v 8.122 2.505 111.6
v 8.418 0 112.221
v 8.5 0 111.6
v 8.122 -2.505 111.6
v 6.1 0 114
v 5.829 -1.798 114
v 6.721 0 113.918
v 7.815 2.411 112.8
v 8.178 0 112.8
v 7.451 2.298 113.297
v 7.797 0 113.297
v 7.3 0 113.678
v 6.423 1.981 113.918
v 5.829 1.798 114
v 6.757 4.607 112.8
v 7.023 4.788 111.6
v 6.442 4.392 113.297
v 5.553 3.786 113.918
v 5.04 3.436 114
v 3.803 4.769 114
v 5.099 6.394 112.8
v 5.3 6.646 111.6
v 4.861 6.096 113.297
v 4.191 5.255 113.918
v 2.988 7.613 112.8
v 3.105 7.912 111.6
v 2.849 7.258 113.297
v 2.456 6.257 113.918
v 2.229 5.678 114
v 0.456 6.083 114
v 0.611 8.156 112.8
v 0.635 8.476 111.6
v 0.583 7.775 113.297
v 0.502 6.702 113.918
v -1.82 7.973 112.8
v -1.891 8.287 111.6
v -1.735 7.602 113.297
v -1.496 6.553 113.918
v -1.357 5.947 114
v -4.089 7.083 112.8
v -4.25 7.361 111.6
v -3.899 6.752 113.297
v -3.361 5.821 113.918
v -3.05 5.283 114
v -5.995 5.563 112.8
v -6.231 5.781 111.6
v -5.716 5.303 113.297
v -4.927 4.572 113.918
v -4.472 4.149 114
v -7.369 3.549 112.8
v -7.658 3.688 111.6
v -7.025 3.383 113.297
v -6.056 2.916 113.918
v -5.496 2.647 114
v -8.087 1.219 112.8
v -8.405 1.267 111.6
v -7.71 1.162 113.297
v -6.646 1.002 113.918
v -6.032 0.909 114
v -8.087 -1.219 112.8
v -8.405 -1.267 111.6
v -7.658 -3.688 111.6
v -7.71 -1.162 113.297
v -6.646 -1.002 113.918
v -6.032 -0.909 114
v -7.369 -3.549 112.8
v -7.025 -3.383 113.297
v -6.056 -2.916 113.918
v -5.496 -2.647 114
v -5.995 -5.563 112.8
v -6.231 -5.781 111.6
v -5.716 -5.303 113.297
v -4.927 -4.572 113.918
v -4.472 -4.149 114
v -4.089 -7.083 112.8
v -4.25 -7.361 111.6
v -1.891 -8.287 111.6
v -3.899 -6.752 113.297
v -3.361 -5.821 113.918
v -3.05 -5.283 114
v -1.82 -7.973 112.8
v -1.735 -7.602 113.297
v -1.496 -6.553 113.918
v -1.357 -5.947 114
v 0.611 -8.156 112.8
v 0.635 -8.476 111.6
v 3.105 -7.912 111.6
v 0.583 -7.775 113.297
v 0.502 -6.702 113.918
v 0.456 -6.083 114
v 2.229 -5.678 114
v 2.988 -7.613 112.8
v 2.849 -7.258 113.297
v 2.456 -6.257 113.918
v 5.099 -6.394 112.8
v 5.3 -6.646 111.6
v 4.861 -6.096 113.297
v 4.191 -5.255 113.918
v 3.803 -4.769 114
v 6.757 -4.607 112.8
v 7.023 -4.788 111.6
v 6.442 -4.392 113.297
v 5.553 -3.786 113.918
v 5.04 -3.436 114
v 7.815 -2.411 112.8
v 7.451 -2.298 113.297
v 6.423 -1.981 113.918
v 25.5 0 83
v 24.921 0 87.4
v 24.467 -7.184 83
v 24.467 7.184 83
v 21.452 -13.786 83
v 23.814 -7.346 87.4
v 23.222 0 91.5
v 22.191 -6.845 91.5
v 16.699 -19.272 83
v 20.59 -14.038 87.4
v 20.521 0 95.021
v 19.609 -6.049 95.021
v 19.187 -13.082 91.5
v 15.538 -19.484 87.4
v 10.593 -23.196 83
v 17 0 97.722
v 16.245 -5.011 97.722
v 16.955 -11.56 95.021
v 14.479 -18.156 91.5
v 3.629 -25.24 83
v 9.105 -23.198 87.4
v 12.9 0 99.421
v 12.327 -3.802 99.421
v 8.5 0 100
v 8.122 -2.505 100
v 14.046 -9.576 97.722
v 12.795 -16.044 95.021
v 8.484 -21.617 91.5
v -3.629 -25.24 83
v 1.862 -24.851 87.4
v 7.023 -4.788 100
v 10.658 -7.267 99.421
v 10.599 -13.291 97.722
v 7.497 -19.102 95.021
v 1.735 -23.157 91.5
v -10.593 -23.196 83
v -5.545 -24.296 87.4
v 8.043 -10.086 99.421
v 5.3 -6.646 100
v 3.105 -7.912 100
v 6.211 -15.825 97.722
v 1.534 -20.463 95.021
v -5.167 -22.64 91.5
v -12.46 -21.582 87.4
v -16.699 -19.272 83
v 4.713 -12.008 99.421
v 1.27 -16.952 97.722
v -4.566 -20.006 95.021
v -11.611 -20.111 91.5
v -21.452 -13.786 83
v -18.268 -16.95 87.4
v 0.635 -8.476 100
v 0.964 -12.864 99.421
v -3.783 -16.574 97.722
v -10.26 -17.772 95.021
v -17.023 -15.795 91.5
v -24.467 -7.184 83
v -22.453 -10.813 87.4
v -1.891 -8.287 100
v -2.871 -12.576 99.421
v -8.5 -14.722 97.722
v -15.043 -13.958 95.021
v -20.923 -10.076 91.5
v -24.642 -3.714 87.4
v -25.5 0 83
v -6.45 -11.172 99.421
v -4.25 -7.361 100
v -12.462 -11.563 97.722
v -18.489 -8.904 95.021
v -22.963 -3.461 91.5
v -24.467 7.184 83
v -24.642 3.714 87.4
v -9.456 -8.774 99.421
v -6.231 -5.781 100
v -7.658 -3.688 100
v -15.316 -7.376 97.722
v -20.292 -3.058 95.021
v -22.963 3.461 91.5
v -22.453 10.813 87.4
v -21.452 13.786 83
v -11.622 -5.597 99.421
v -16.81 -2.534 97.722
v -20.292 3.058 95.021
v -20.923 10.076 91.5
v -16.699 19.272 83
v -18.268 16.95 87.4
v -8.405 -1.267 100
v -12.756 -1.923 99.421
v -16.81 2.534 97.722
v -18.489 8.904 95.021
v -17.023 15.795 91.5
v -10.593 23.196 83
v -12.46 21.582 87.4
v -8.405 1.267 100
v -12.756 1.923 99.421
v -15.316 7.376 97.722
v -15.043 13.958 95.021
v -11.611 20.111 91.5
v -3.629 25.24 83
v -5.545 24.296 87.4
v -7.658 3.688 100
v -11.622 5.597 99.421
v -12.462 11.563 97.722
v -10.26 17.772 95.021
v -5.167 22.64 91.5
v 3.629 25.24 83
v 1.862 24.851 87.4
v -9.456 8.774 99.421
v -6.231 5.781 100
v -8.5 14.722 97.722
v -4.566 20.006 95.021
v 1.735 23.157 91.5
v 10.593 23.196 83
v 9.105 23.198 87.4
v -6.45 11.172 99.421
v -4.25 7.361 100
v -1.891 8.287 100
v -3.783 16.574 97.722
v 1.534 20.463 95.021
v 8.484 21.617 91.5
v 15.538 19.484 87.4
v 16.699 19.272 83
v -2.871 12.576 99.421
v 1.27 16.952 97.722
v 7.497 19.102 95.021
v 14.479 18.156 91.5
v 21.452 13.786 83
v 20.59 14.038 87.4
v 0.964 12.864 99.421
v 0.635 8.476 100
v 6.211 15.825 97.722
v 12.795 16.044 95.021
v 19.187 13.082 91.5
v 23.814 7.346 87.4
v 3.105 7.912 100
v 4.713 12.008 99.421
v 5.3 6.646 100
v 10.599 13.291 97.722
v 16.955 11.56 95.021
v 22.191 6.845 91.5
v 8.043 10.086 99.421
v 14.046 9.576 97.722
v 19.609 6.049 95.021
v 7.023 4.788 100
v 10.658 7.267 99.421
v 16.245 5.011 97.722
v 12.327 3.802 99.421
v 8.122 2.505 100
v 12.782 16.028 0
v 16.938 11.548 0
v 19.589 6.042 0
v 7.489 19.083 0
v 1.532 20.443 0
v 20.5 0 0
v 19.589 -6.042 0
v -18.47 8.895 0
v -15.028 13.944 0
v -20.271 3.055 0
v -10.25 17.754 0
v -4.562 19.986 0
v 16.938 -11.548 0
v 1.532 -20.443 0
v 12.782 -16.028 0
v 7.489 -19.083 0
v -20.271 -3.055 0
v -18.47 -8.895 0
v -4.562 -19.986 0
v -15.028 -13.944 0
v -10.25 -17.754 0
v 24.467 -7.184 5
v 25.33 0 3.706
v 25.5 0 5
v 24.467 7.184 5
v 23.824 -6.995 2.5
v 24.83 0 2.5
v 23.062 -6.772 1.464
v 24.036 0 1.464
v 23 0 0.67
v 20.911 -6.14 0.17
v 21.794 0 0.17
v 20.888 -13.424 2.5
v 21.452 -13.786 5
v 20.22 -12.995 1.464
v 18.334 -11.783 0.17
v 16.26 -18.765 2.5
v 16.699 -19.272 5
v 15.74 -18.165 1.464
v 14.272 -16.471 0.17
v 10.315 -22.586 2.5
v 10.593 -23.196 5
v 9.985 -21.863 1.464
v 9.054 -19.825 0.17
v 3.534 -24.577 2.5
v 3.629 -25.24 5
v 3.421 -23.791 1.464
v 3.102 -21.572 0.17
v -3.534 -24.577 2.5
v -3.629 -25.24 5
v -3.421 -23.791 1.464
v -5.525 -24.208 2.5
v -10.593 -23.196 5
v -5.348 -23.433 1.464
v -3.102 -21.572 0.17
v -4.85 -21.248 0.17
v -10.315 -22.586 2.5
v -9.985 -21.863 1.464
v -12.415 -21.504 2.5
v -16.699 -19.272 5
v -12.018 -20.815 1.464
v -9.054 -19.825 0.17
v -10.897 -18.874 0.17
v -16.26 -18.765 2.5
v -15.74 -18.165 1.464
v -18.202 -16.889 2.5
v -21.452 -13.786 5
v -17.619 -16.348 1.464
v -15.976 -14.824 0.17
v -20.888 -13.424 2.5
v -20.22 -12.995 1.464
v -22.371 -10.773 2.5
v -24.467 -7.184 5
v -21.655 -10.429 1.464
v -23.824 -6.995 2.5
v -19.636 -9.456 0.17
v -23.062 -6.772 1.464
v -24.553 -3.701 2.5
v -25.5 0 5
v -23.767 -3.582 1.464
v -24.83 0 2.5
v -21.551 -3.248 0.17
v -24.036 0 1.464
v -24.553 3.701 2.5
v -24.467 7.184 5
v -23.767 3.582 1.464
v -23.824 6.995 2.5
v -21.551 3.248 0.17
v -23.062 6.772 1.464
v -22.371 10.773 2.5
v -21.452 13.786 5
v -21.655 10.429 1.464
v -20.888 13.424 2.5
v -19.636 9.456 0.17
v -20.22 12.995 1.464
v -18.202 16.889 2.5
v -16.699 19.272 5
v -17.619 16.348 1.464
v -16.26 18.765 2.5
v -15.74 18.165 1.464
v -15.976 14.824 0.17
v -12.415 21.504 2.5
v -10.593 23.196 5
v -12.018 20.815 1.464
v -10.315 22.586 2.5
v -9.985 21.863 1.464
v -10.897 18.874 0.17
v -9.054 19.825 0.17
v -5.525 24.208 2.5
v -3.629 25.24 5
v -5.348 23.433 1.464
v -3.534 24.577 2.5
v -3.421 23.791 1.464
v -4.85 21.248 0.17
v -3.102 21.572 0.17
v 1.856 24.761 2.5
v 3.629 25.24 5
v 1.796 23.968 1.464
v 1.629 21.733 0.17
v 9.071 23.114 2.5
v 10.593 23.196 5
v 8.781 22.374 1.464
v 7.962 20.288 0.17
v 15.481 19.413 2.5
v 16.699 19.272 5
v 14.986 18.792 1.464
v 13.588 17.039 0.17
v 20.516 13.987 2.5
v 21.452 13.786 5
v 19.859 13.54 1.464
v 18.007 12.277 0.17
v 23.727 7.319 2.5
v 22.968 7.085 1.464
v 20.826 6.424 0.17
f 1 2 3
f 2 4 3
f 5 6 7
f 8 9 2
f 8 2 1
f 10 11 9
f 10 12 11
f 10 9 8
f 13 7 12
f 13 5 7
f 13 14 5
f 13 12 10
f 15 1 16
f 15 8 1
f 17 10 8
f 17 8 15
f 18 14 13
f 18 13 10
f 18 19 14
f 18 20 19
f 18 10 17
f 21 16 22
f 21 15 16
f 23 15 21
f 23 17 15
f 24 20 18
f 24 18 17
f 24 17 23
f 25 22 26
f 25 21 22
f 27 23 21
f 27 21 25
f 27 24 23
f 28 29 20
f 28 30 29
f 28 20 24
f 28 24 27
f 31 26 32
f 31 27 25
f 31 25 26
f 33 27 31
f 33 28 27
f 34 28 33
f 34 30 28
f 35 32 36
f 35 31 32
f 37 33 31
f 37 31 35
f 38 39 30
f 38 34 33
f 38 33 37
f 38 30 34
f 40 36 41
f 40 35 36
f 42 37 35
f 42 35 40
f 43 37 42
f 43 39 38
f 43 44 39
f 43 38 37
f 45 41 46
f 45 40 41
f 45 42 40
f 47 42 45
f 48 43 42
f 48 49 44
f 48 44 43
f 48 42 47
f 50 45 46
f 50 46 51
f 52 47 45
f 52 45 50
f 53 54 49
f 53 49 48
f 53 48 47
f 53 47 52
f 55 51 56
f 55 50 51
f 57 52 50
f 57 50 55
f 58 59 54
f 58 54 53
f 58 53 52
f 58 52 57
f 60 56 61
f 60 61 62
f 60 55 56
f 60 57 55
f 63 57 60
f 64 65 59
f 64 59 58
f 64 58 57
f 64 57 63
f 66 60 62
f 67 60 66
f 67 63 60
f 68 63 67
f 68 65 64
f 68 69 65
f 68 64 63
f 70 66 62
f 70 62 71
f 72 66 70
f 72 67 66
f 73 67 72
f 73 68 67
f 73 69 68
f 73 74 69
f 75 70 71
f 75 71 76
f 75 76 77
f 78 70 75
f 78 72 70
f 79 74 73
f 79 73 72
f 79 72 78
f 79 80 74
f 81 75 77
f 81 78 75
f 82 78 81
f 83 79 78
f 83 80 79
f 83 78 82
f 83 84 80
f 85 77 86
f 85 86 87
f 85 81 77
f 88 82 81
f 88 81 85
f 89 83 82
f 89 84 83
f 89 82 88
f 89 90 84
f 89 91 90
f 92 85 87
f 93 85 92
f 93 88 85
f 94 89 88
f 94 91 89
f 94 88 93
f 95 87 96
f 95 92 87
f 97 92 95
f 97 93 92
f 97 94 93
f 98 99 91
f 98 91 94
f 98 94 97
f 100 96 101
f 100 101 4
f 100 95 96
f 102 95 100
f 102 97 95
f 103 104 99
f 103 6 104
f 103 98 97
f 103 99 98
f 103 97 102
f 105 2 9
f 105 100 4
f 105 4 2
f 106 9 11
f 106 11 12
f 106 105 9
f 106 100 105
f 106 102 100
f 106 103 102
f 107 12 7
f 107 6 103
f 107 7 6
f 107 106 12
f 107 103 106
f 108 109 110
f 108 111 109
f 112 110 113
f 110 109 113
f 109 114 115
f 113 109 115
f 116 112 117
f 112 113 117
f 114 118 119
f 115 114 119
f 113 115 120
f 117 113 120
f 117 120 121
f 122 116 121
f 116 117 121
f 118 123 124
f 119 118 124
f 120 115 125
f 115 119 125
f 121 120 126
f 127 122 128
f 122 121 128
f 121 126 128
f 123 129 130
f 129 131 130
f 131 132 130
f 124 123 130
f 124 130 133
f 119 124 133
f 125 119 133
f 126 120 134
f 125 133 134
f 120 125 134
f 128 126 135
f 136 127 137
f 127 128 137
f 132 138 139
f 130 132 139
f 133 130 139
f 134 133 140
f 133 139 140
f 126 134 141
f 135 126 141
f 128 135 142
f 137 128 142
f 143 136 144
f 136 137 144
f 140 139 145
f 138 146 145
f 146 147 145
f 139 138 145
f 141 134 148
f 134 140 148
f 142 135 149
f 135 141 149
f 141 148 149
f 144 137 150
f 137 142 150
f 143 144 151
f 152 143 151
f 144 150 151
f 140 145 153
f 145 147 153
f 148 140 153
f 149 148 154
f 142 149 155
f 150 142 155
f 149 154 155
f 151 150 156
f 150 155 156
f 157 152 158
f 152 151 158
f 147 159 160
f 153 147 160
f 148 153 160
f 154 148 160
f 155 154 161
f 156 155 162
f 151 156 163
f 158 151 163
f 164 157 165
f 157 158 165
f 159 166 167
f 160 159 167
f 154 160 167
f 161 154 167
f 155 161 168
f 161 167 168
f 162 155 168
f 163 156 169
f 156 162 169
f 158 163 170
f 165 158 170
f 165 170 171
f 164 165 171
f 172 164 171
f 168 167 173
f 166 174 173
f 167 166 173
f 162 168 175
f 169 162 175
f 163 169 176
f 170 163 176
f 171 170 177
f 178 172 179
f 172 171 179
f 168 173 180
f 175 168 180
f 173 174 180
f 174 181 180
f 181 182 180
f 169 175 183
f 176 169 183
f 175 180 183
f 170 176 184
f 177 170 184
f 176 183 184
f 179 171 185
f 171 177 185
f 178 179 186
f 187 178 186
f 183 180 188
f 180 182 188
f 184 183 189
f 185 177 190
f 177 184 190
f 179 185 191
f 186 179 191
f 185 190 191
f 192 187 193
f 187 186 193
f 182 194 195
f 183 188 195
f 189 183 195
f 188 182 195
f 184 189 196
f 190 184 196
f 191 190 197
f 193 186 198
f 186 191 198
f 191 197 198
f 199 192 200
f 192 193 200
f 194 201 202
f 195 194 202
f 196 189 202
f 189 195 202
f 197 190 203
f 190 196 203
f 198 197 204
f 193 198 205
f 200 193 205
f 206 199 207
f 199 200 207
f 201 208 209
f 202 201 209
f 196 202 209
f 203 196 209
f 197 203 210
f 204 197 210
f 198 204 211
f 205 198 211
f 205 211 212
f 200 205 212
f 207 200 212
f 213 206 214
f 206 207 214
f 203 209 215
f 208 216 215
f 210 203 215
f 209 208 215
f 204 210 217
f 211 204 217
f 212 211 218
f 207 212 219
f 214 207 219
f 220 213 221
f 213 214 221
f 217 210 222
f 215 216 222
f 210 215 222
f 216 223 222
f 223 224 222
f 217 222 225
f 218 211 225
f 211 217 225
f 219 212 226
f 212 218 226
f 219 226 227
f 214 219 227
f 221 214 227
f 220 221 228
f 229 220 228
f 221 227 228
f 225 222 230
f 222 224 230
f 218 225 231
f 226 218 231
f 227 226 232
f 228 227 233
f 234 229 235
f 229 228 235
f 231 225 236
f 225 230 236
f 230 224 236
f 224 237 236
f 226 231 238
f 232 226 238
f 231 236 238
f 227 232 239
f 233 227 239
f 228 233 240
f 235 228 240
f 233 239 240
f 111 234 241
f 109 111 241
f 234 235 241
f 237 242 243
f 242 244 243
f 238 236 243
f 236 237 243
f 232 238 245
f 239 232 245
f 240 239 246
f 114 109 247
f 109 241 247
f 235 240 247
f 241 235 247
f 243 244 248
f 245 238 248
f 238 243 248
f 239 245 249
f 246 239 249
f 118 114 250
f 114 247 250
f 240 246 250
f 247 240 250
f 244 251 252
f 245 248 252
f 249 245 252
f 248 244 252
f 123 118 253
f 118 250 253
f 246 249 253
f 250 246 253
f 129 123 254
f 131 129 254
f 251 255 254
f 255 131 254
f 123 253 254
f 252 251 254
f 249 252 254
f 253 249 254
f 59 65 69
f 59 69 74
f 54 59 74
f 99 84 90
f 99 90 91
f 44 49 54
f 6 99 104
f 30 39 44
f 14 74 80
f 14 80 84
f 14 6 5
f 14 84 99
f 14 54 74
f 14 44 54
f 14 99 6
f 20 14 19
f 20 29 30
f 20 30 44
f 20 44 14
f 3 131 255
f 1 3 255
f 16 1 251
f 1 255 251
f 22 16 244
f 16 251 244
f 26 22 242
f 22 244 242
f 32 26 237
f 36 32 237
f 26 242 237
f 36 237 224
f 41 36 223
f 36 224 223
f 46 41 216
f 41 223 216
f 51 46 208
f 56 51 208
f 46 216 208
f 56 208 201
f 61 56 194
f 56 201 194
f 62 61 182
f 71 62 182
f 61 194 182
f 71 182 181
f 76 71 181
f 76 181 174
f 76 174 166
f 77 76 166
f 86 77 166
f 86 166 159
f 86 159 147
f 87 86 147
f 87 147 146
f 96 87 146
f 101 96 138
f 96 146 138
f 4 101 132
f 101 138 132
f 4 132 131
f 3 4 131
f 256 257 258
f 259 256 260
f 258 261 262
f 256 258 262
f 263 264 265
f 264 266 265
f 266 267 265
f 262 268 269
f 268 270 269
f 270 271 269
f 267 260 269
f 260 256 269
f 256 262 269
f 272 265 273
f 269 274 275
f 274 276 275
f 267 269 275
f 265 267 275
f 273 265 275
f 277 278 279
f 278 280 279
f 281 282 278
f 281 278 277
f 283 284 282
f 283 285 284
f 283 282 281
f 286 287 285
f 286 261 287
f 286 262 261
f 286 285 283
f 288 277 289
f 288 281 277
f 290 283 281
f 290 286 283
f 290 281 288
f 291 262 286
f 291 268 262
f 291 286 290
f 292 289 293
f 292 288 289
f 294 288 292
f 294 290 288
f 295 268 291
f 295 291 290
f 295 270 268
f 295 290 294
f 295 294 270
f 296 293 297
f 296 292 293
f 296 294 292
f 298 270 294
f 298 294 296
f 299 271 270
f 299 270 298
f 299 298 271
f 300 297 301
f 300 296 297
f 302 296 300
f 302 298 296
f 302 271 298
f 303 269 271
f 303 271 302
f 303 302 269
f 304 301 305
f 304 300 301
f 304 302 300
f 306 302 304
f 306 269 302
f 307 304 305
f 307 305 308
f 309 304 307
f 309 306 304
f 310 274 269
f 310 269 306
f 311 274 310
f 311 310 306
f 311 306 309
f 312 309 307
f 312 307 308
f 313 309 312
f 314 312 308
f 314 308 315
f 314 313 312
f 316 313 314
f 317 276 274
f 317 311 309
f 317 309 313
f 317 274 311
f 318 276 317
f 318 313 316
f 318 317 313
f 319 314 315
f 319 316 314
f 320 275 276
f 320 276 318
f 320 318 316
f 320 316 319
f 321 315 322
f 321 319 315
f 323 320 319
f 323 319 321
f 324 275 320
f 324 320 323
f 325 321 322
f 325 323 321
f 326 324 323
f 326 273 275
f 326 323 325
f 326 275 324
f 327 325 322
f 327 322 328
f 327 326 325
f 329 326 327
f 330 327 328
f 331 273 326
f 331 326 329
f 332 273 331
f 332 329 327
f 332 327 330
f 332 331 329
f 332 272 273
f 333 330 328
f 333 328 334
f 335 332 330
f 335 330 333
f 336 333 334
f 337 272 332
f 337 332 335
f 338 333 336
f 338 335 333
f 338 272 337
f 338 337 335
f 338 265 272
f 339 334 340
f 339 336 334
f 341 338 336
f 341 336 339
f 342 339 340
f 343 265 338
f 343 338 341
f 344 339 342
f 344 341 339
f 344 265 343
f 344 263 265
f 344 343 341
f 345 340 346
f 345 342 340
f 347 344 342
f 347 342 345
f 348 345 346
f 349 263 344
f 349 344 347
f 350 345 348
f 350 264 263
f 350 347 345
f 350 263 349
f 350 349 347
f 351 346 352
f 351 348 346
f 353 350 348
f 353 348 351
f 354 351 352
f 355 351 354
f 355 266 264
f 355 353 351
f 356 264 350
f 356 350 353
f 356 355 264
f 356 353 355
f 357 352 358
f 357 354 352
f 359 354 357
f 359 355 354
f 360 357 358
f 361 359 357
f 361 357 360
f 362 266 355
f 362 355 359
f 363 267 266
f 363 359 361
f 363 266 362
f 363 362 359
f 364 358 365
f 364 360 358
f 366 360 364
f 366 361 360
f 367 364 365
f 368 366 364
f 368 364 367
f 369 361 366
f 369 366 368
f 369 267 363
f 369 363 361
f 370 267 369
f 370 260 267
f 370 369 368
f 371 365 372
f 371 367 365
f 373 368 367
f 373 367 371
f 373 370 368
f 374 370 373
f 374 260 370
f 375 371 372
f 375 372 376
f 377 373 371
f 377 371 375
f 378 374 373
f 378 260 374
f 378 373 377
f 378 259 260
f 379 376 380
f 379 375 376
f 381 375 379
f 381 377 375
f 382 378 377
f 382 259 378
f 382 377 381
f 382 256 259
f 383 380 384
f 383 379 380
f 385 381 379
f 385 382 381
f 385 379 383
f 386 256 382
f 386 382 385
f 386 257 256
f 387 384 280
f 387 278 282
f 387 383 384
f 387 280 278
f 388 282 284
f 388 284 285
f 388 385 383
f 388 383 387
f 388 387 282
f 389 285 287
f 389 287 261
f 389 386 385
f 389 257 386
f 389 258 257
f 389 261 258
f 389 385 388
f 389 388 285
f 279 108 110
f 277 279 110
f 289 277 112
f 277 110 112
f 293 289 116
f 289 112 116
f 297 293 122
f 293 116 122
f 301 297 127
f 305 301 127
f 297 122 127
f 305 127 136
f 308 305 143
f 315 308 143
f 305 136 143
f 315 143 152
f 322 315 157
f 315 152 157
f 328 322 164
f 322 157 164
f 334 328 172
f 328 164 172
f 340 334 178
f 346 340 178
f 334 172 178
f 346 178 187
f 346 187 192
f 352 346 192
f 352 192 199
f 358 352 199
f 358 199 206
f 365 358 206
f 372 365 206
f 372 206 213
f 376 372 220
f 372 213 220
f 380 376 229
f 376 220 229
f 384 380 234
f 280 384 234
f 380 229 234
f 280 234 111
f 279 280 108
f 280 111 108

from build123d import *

# Parameters (mm, degrees)
F2_R     = 8.5
F3_DEPTH = 14
F4_R     = 2.4
F5_R     = 5


with BuildPart() as f1:
    # F0 (on Front) → F1 (revolve)
    with BuildSketch(Plane.XZ):
        with BuildLine():
            Line((0, 100), (0, 0))
            Line((0, 0), (25.5, 0))
            Line((25.5, 0), (25.5, 83))
            ThreePointArc((25.5, 83), (20.520815, 95.020815), (8.5, 100))
            Line((8.5, 100), (0, 100))
        make_face()
    revolve(axis=Axis((0, 0, 50), (0, 0, -1)))

    # F2 (on face) → F3 (join)
    with BuildSketch(Plane.XY.offset(100)):
        Circle(F2_R)
    extrude(amount=F3_DEPTH)

    # F4
    f4_edges = [f1.edges().sort_by_distance(p)[0] for p in [
        (-8.5, 0, 114),
    ]]
    fillet(f4_edges, radius=F4_R)

    # F5
    f5_edges = [f1.edges().sort_by_distance(p)[0] for p in [
        (-25.5, 0, 0),
    ]]
    fillet(f5_edges, radius=F5_R)


solid = f1.part
